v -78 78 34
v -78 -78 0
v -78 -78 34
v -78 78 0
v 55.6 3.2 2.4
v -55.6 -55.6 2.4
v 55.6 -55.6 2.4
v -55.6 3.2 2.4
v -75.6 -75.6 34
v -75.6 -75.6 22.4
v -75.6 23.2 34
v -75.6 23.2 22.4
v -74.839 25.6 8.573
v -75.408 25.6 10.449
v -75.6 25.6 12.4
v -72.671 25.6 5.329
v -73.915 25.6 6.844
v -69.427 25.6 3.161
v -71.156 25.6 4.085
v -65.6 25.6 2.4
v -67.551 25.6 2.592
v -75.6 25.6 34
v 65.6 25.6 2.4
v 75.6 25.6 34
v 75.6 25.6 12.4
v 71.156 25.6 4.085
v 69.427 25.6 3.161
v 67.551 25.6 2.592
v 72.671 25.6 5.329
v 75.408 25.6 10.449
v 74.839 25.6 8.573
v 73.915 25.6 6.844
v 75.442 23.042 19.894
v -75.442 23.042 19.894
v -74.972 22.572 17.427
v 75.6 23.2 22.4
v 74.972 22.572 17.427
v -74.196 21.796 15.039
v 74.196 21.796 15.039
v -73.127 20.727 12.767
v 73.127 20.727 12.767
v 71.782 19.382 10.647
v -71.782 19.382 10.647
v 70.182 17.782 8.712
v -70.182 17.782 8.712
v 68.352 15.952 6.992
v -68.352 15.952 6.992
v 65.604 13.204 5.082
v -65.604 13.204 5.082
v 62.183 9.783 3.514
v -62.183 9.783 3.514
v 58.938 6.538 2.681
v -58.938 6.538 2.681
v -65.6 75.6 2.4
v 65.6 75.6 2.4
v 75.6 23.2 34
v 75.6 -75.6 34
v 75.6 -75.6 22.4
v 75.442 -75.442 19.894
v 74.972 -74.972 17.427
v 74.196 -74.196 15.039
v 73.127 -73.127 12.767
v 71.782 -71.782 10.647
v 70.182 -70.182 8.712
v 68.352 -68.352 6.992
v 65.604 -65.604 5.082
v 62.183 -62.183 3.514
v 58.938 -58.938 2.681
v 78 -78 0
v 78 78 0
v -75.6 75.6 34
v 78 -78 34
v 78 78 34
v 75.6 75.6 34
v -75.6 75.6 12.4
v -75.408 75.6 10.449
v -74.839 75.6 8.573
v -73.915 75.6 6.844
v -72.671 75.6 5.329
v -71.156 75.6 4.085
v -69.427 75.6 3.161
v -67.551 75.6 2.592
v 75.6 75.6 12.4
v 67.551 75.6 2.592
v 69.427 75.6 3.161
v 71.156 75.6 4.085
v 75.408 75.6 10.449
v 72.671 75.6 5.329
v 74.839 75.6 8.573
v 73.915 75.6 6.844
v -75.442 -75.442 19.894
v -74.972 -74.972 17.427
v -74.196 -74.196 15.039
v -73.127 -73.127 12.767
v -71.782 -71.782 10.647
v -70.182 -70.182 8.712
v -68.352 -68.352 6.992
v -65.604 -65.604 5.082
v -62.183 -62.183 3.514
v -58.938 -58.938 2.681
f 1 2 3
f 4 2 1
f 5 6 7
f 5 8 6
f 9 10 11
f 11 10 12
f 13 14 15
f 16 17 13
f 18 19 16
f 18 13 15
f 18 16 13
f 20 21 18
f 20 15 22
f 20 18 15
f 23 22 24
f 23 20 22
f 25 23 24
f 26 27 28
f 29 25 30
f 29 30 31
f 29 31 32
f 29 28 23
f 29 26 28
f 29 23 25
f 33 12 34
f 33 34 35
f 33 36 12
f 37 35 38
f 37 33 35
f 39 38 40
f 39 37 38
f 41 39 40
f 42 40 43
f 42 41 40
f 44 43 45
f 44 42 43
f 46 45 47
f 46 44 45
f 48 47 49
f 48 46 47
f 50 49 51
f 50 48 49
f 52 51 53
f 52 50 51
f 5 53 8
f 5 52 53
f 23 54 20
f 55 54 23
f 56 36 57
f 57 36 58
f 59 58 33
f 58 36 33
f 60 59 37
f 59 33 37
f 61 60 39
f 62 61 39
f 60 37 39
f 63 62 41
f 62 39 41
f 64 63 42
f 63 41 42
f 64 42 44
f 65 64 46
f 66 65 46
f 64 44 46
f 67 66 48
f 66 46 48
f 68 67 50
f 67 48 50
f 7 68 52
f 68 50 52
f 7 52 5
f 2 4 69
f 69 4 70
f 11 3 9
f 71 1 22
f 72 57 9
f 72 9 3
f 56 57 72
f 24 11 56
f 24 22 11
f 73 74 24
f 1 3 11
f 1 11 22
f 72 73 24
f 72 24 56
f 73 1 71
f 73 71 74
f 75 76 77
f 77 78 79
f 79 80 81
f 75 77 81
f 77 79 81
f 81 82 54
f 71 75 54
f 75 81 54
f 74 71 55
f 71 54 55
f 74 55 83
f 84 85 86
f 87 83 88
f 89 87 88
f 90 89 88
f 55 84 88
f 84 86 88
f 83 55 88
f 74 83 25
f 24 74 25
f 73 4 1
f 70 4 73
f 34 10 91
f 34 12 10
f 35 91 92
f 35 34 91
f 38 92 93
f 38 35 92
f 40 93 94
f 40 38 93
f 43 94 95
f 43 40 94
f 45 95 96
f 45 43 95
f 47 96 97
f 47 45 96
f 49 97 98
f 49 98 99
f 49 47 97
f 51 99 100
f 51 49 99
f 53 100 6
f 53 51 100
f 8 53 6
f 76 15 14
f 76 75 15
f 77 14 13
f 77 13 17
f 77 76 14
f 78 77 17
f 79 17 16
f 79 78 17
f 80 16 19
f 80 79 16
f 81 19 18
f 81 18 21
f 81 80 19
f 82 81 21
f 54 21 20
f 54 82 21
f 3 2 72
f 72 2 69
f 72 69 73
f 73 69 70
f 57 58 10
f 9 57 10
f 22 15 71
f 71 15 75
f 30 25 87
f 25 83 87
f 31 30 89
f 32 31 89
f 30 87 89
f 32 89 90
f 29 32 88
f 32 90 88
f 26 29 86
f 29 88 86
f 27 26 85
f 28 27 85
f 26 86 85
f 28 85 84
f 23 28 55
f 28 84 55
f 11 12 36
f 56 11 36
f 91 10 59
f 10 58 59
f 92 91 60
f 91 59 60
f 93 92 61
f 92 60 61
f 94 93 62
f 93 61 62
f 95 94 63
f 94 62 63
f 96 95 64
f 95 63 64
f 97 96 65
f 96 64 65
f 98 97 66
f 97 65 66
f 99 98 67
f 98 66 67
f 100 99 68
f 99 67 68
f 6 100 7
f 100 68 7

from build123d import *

# Parameters (mm, degrees)
F0_W     = 151.2
F0_H     = 50
F1_DEPTH = 2.4
F0_H_2   = 98.8
F0_W_2   = 156
F0_H_3   = 156
F0_H_4   = 2.4
F2_DEPTH = 34
F3_R     = 20
F4_R     = 10


with BuildPart() as f1:
    # F0 (on Top) → F1 (new body)
    with BuildSketch(Plane.XY):
        with Locations((0, 50.6)):
            Rectangle(F0_W, F0_H)
    extrude(amount=F1_DEPTH)



with BuildPart() as f1b:
    # F0 (on Top) → F1, piece 2 (new body)
    with BuildSketch(Plane.XY):
        with Locations((0, -26.2)):
            Rectangle(F0_W, F0_H_2)
    extrude(amount=F1_DEPTH)


with BuildPart() as f1_1:
    add(f1.part)

    add(f1b.part)  # F2 merges F1b
    # F0 (on Top) → F2 (join)
    with BuildSketch(Plane.XY):
        Rectangle(F0_W_2, F0_H_3)
        Polygon((-75.6, 25.6), (-75.6, 75.6), (75.6, 75.6), (75.6, 25.6), (75.6, 23.2), (75.6, -75.6), (-75.6, -75.6), (-75.6, 23.2), align=None, mode=Mode.SUBTRACT)
        with Locations((0, 24.4)):
            Rectangle(F0_W, F0_H_4)
    extrude(amount=F2_DEPTH)

    # F3
    f3_edges = [f1_1.edges().sort_by_distance(p)[0] for p in [
        (0, -75.6, 2.4),
        (75.6, -26.2, 2.4),
        (0, 23.2, 2.4),
        (-75.6, -26.2, 2.4),
    ]]
    fillet(f3_edges, radius=F3_R)

    # F4
    f4_edges = [f1_1.edges().sort_by_distance(p)[0] for p in [
        (75.6, 50.6, 2.4),
        (-75.6, 50.6, 2.4),
    ]]
    fillet(f4_edges, radius=F4_R)


solid = f1_1.part
